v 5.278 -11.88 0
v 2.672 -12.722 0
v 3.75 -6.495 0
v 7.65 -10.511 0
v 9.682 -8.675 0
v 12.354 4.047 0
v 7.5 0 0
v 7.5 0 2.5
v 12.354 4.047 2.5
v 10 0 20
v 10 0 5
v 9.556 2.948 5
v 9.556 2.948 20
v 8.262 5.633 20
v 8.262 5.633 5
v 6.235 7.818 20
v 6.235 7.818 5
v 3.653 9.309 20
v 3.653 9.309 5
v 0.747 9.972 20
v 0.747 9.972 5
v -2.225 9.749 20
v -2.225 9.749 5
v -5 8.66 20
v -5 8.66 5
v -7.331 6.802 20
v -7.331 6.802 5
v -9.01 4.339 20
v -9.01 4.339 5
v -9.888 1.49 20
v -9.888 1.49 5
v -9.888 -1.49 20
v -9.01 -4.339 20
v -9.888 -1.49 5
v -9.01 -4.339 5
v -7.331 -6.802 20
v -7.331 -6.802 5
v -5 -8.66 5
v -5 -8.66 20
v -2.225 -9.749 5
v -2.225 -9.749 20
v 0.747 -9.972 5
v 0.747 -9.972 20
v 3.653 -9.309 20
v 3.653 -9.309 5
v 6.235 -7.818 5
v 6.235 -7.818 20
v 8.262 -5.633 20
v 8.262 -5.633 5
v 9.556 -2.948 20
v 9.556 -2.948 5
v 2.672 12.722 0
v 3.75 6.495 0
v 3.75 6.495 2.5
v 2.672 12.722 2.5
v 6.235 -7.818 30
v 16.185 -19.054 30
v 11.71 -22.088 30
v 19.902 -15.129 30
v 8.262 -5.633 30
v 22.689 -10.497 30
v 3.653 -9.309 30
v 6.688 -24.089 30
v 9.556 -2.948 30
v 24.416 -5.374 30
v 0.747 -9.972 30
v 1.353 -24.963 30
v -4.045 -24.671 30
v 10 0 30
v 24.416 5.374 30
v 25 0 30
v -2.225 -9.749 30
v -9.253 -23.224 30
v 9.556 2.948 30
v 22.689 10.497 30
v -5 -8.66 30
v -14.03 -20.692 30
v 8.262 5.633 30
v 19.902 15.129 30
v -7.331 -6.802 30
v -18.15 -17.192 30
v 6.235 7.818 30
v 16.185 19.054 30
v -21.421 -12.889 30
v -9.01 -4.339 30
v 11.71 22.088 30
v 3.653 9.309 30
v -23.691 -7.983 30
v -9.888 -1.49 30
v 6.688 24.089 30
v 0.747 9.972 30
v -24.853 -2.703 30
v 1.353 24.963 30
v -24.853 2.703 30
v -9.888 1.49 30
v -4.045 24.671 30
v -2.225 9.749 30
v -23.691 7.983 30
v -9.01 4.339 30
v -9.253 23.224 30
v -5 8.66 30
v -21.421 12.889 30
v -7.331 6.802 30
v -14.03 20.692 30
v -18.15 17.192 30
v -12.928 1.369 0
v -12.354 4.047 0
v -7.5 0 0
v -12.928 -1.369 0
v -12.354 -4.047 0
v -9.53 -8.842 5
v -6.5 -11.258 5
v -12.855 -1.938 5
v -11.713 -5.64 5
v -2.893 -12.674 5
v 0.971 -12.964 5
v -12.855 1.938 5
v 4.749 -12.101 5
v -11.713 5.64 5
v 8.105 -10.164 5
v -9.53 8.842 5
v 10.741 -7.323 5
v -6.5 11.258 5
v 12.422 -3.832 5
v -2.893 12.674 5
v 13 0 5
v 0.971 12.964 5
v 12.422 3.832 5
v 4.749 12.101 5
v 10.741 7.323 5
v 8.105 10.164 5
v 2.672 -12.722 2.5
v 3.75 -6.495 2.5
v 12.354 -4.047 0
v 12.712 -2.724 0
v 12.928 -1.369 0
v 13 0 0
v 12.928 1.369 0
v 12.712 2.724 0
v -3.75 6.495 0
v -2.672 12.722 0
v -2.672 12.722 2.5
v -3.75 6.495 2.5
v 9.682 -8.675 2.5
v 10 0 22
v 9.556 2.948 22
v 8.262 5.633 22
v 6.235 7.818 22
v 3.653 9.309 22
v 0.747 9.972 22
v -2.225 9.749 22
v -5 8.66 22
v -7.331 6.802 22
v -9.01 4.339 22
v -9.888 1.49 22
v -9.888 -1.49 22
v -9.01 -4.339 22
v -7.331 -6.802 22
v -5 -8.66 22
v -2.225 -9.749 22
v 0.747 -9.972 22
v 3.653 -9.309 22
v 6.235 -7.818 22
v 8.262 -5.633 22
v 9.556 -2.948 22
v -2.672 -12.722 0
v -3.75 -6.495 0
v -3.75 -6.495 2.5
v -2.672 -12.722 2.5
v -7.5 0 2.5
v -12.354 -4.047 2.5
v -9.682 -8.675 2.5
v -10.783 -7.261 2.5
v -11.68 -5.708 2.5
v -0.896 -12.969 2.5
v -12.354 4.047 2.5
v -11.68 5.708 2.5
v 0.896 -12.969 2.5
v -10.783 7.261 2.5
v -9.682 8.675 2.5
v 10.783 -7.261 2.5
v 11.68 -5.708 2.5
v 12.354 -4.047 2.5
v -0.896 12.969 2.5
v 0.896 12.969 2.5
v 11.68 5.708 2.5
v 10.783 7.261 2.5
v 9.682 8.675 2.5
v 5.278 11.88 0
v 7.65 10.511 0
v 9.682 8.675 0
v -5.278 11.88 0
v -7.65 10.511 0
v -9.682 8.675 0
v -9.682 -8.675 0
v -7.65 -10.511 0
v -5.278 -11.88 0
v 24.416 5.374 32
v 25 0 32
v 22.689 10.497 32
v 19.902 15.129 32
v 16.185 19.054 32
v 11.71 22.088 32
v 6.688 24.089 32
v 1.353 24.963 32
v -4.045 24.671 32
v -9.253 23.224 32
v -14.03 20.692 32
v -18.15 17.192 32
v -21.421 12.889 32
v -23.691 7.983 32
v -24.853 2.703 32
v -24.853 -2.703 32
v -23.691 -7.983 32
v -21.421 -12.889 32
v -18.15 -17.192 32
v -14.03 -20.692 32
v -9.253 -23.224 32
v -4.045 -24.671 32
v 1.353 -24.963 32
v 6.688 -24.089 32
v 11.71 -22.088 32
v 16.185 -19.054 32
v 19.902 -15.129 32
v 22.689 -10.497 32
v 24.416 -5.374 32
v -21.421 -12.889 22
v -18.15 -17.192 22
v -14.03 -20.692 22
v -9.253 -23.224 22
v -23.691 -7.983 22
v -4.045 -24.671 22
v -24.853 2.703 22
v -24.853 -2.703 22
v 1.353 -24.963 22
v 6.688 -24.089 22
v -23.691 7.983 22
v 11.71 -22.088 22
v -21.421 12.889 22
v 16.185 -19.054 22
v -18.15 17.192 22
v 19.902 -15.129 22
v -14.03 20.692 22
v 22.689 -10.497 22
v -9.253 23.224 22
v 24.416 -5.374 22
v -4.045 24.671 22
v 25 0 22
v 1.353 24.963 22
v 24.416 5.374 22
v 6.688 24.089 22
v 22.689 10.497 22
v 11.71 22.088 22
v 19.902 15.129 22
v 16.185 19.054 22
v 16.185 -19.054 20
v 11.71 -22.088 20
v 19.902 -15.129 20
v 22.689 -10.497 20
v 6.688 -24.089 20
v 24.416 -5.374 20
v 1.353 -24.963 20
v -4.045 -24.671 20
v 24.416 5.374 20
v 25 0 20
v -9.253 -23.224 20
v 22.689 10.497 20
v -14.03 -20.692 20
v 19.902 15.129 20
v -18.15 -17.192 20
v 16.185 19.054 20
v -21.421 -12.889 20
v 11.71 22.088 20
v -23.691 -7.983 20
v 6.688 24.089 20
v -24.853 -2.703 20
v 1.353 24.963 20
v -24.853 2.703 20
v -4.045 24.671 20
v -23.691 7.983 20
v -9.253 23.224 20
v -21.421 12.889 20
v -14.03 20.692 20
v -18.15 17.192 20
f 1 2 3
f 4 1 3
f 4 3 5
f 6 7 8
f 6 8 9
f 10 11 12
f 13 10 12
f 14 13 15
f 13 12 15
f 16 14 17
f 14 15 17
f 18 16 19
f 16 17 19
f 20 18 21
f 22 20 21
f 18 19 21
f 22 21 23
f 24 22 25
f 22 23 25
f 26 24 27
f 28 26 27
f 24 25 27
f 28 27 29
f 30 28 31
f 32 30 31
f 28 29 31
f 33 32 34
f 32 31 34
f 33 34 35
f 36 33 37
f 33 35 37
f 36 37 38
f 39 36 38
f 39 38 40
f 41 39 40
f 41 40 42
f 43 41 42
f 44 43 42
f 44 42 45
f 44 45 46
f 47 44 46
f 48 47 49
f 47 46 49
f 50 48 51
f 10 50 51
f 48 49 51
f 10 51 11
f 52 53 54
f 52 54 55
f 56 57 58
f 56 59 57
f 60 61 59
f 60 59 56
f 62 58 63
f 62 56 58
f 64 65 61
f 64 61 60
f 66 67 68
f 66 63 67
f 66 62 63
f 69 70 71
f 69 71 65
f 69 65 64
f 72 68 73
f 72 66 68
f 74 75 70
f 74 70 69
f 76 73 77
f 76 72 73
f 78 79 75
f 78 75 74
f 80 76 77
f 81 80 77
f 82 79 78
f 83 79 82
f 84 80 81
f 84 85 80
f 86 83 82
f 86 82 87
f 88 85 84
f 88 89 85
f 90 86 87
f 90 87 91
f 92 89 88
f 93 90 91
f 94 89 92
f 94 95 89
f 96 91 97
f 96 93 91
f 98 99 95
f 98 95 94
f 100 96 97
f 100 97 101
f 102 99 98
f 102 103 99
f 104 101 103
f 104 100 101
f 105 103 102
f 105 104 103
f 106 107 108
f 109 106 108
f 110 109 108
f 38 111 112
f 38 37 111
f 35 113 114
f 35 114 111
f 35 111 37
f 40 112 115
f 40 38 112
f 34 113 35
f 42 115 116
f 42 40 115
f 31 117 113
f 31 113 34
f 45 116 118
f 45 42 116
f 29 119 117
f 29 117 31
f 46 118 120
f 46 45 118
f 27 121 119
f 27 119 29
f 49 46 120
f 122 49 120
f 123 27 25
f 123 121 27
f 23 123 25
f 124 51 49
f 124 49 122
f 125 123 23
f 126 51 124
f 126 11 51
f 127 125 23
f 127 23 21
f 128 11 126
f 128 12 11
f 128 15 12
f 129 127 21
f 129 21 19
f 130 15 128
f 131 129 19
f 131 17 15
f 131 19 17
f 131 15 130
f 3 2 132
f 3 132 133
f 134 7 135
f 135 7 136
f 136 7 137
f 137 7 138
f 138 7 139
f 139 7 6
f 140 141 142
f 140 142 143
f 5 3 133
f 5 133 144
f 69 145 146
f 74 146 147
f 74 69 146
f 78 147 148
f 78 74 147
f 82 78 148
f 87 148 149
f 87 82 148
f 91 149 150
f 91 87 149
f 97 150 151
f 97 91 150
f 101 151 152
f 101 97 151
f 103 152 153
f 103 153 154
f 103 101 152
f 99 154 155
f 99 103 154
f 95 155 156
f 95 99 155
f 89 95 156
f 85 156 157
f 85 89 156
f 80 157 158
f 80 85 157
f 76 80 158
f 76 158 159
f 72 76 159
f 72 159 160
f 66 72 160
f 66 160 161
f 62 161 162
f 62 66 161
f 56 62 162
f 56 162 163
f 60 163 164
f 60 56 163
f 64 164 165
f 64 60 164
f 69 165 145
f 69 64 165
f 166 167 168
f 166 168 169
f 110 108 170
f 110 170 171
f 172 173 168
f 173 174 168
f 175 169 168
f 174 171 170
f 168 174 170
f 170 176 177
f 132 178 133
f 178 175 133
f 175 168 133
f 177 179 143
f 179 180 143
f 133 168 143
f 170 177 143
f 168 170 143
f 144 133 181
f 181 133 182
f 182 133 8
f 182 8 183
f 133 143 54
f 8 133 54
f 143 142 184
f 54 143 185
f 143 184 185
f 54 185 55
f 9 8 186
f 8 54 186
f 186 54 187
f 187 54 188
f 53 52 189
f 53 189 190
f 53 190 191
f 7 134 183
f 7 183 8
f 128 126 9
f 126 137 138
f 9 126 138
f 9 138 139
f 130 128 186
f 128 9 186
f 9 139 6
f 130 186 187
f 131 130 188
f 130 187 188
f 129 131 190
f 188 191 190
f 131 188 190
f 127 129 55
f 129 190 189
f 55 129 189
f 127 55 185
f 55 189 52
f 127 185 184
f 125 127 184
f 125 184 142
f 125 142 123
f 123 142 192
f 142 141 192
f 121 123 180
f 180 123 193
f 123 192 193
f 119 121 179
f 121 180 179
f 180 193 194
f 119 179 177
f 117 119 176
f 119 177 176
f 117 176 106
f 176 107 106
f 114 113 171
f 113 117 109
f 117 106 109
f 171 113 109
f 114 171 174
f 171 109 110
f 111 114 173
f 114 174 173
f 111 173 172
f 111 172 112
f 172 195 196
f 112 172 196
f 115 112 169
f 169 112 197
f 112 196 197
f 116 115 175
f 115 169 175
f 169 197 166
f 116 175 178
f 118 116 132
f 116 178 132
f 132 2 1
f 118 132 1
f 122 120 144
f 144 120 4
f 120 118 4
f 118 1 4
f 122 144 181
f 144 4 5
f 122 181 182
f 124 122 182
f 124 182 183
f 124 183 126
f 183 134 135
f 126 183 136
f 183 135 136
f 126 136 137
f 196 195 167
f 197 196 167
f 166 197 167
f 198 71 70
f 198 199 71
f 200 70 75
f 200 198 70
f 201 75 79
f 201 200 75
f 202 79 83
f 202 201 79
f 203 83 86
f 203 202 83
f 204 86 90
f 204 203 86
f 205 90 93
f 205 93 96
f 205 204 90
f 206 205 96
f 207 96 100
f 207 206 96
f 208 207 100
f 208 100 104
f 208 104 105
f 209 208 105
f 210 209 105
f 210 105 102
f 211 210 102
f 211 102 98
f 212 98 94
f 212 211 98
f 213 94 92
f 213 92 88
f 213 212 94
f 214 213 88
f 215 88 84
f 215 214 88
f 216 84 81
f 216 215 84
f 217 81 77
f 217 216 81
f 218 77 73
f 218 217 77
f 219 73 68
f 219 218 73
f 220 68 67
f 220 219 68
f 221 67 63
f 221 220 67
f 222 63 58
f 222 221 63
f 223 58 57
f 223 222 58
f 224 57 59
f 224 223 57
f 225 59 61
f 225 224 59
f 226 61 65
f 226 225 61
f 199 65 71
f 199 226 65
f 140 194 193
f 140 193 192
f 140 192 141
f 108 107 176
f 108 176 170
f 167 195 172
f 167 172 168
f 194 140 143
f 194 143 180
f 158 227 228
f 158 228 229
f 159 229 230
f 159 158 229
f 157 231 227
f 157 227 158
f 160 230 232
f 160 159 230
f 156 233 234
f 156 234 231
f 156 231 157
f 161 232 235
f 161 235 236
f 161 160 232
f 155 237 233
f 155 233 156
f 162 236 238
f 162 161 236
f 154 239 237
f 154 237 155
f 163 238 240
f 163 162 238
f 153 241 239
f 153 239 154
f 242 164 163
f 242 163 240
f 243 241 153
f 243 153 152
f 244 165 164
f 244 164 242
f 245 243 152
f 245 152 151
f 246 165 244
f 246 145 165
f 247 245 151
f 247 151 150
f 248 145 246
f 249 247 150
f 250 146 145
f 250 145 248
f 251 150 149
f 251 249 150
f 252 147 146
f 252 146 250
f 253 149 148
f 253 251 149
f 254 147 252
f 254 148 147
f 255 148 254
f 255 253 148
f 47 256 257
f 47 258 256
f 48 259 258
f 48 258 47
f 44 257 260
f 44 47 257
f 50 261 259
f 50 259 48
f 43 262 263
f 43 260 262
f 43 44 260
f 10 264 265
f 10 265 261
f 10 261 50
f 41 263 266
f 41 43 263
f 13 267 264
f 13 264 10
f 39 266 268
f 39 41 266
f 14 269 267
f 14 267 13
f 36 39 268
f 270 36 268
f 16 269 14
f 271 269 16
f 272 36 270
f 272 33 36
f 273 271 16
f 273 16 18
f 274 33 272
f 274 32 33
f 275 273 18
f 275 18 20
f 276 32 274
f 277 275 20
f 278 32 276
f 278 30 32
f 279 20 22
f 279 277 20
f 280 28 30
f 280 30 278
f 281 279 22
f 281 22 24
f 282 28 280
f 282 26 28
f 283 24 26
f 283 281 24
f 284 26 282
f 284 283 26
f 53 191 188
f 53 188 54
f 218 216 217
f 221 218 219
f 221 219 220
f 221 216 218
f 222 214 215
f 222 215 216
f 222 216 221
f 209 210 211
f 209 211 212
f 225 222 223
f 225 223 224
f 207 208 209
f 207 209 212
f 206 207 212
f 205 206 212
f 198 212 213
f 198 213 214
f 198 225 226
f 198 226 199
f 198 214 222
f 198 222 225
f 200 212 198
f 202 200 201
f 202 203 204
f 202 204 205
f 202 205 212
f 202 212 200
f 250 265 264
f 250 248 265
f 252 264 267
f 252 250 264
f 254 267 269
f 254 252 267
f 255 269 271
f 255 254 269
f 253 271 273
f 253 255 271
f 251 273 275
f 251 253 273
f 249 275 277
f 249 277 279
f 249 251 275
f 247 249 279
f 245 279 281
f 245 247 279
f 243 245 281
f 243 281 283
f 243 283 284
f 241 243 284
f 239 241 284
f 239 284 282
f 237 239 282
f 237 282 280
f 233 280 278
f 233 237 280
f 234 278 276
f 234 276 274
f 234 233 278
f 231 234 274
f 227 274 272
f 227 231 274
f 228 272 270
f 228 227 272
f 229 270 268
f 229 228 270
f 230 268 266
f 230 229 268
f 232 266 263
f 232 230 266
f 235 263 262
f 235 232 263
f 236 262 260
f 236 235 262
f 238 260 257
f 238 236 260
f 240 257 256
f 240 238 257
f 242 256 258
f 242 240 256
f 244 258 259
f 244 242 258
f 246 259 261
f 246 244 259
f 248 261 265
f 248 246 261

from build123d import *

# Parameters (mm, degrees)
SKETCH_3_R          = 13
EXTRUDE_1_DEPTH     = 5
CUT_EXTRUDE_2_DEPTH = 2.5
SKETCH_4_R          = 10
EXTRUDE_2_DEPTH     = 15


with BuildPart() as part:
    # ｽｹｯﾁ3 → ﾎﾞｽ - 押し出し1 (new body)
    with BuildSketch(Plane.XY):
        Circle(SKETCH_3_R)
    extrude(amount=EXTRUDE_1_DEPTH)

    # ｽｹｯﾁ2 → ｶｯﾄ - 押し出し2 (cut)
    with BuildSketch(Plane.XY):
        with BuildLine():
            Line((3.75, 6.495190528), (2.463350586, 13.926501921))
            ThreePointArc((2.463350586, 13.926501921), (0, 16), (-2.463350586, 13.926501921))
            Line((-2.463350586, 13.926501921), (-3.75, 6.495190528))
            Line((-3.75, 6.495190528), (-10.829029157, 9.096575147))
            ThreePointArc((-10.829029157, 9.096575147), (-13.856406461, 8), (-13.292379743, 4.829926775))
            Line((-13.292379743, 4.829926775), (-7.5, 0))
            Line((-7.5, 0), (-13.292379743, -4.829926775))
            ThreePointArc((-13.292379743, -4.829926775), (-13.856406461, -8), (-10.829029157, -9.096575147))
            Line((-10.829029157, -9.096575147), (-3.75, -6.495190528))
            Line((-3.75, -6.495190528), (-2.463350586, -13.926501921))
            ThreePointArc((-2.463350586, -13.926501921), (0, -16), (2.463350586, -13.926501921))
            Line((2.463350586, -13.926501921), (3.75, -6.495190528))
            Line((3.75, -6.495190528), (10.829029157, -9.096575147))
            ThreePointArc((10.829029157, -9.096575147), (13.856406461, -8), (13.292379743, -4.829926775))
            Line((13.292379743, -4.829926775), (7.5, 0))
            Line((7.5, 0), (13.292379743, 4.829926775))
            ThreePointArc((13.292379743, 4.829926775), (13.856406461, 8), (10.829029157, 9.096575147))
            Line((10.829029157, 9.096575147), (3.75, 6.495190528))
        make_face()
    extrude(amount=CUT_EXTRUDE_2_DEPTH, mode=Mode.SUBTRACT)

    # ｽｹｯﾁ4 → ﾎﾞｽ - 押し出し2 (add)
    with BuildSketch(Plane.XY.offset(5)):
        Circle(SKETCH_4_R)
    extrude(amount=EXTRUDE_2_DEPTH)

    # ｽｹｯﾁ5 → 回転1 (revolve)
    with BuildSketch(Plane(origin=(0, 0, 0), x_dir=(1, 0, 0), z_dir=(0, 1, 0))):
        Polygon((0, -20), (25, -20), (25, -22), (10, -22), (10, -30), (25, -30), (25, -32), (0, -32), align=None)
    revolve(axis=Axis((0, 0, 0), (0, 0, 1)))


solid = part.part
